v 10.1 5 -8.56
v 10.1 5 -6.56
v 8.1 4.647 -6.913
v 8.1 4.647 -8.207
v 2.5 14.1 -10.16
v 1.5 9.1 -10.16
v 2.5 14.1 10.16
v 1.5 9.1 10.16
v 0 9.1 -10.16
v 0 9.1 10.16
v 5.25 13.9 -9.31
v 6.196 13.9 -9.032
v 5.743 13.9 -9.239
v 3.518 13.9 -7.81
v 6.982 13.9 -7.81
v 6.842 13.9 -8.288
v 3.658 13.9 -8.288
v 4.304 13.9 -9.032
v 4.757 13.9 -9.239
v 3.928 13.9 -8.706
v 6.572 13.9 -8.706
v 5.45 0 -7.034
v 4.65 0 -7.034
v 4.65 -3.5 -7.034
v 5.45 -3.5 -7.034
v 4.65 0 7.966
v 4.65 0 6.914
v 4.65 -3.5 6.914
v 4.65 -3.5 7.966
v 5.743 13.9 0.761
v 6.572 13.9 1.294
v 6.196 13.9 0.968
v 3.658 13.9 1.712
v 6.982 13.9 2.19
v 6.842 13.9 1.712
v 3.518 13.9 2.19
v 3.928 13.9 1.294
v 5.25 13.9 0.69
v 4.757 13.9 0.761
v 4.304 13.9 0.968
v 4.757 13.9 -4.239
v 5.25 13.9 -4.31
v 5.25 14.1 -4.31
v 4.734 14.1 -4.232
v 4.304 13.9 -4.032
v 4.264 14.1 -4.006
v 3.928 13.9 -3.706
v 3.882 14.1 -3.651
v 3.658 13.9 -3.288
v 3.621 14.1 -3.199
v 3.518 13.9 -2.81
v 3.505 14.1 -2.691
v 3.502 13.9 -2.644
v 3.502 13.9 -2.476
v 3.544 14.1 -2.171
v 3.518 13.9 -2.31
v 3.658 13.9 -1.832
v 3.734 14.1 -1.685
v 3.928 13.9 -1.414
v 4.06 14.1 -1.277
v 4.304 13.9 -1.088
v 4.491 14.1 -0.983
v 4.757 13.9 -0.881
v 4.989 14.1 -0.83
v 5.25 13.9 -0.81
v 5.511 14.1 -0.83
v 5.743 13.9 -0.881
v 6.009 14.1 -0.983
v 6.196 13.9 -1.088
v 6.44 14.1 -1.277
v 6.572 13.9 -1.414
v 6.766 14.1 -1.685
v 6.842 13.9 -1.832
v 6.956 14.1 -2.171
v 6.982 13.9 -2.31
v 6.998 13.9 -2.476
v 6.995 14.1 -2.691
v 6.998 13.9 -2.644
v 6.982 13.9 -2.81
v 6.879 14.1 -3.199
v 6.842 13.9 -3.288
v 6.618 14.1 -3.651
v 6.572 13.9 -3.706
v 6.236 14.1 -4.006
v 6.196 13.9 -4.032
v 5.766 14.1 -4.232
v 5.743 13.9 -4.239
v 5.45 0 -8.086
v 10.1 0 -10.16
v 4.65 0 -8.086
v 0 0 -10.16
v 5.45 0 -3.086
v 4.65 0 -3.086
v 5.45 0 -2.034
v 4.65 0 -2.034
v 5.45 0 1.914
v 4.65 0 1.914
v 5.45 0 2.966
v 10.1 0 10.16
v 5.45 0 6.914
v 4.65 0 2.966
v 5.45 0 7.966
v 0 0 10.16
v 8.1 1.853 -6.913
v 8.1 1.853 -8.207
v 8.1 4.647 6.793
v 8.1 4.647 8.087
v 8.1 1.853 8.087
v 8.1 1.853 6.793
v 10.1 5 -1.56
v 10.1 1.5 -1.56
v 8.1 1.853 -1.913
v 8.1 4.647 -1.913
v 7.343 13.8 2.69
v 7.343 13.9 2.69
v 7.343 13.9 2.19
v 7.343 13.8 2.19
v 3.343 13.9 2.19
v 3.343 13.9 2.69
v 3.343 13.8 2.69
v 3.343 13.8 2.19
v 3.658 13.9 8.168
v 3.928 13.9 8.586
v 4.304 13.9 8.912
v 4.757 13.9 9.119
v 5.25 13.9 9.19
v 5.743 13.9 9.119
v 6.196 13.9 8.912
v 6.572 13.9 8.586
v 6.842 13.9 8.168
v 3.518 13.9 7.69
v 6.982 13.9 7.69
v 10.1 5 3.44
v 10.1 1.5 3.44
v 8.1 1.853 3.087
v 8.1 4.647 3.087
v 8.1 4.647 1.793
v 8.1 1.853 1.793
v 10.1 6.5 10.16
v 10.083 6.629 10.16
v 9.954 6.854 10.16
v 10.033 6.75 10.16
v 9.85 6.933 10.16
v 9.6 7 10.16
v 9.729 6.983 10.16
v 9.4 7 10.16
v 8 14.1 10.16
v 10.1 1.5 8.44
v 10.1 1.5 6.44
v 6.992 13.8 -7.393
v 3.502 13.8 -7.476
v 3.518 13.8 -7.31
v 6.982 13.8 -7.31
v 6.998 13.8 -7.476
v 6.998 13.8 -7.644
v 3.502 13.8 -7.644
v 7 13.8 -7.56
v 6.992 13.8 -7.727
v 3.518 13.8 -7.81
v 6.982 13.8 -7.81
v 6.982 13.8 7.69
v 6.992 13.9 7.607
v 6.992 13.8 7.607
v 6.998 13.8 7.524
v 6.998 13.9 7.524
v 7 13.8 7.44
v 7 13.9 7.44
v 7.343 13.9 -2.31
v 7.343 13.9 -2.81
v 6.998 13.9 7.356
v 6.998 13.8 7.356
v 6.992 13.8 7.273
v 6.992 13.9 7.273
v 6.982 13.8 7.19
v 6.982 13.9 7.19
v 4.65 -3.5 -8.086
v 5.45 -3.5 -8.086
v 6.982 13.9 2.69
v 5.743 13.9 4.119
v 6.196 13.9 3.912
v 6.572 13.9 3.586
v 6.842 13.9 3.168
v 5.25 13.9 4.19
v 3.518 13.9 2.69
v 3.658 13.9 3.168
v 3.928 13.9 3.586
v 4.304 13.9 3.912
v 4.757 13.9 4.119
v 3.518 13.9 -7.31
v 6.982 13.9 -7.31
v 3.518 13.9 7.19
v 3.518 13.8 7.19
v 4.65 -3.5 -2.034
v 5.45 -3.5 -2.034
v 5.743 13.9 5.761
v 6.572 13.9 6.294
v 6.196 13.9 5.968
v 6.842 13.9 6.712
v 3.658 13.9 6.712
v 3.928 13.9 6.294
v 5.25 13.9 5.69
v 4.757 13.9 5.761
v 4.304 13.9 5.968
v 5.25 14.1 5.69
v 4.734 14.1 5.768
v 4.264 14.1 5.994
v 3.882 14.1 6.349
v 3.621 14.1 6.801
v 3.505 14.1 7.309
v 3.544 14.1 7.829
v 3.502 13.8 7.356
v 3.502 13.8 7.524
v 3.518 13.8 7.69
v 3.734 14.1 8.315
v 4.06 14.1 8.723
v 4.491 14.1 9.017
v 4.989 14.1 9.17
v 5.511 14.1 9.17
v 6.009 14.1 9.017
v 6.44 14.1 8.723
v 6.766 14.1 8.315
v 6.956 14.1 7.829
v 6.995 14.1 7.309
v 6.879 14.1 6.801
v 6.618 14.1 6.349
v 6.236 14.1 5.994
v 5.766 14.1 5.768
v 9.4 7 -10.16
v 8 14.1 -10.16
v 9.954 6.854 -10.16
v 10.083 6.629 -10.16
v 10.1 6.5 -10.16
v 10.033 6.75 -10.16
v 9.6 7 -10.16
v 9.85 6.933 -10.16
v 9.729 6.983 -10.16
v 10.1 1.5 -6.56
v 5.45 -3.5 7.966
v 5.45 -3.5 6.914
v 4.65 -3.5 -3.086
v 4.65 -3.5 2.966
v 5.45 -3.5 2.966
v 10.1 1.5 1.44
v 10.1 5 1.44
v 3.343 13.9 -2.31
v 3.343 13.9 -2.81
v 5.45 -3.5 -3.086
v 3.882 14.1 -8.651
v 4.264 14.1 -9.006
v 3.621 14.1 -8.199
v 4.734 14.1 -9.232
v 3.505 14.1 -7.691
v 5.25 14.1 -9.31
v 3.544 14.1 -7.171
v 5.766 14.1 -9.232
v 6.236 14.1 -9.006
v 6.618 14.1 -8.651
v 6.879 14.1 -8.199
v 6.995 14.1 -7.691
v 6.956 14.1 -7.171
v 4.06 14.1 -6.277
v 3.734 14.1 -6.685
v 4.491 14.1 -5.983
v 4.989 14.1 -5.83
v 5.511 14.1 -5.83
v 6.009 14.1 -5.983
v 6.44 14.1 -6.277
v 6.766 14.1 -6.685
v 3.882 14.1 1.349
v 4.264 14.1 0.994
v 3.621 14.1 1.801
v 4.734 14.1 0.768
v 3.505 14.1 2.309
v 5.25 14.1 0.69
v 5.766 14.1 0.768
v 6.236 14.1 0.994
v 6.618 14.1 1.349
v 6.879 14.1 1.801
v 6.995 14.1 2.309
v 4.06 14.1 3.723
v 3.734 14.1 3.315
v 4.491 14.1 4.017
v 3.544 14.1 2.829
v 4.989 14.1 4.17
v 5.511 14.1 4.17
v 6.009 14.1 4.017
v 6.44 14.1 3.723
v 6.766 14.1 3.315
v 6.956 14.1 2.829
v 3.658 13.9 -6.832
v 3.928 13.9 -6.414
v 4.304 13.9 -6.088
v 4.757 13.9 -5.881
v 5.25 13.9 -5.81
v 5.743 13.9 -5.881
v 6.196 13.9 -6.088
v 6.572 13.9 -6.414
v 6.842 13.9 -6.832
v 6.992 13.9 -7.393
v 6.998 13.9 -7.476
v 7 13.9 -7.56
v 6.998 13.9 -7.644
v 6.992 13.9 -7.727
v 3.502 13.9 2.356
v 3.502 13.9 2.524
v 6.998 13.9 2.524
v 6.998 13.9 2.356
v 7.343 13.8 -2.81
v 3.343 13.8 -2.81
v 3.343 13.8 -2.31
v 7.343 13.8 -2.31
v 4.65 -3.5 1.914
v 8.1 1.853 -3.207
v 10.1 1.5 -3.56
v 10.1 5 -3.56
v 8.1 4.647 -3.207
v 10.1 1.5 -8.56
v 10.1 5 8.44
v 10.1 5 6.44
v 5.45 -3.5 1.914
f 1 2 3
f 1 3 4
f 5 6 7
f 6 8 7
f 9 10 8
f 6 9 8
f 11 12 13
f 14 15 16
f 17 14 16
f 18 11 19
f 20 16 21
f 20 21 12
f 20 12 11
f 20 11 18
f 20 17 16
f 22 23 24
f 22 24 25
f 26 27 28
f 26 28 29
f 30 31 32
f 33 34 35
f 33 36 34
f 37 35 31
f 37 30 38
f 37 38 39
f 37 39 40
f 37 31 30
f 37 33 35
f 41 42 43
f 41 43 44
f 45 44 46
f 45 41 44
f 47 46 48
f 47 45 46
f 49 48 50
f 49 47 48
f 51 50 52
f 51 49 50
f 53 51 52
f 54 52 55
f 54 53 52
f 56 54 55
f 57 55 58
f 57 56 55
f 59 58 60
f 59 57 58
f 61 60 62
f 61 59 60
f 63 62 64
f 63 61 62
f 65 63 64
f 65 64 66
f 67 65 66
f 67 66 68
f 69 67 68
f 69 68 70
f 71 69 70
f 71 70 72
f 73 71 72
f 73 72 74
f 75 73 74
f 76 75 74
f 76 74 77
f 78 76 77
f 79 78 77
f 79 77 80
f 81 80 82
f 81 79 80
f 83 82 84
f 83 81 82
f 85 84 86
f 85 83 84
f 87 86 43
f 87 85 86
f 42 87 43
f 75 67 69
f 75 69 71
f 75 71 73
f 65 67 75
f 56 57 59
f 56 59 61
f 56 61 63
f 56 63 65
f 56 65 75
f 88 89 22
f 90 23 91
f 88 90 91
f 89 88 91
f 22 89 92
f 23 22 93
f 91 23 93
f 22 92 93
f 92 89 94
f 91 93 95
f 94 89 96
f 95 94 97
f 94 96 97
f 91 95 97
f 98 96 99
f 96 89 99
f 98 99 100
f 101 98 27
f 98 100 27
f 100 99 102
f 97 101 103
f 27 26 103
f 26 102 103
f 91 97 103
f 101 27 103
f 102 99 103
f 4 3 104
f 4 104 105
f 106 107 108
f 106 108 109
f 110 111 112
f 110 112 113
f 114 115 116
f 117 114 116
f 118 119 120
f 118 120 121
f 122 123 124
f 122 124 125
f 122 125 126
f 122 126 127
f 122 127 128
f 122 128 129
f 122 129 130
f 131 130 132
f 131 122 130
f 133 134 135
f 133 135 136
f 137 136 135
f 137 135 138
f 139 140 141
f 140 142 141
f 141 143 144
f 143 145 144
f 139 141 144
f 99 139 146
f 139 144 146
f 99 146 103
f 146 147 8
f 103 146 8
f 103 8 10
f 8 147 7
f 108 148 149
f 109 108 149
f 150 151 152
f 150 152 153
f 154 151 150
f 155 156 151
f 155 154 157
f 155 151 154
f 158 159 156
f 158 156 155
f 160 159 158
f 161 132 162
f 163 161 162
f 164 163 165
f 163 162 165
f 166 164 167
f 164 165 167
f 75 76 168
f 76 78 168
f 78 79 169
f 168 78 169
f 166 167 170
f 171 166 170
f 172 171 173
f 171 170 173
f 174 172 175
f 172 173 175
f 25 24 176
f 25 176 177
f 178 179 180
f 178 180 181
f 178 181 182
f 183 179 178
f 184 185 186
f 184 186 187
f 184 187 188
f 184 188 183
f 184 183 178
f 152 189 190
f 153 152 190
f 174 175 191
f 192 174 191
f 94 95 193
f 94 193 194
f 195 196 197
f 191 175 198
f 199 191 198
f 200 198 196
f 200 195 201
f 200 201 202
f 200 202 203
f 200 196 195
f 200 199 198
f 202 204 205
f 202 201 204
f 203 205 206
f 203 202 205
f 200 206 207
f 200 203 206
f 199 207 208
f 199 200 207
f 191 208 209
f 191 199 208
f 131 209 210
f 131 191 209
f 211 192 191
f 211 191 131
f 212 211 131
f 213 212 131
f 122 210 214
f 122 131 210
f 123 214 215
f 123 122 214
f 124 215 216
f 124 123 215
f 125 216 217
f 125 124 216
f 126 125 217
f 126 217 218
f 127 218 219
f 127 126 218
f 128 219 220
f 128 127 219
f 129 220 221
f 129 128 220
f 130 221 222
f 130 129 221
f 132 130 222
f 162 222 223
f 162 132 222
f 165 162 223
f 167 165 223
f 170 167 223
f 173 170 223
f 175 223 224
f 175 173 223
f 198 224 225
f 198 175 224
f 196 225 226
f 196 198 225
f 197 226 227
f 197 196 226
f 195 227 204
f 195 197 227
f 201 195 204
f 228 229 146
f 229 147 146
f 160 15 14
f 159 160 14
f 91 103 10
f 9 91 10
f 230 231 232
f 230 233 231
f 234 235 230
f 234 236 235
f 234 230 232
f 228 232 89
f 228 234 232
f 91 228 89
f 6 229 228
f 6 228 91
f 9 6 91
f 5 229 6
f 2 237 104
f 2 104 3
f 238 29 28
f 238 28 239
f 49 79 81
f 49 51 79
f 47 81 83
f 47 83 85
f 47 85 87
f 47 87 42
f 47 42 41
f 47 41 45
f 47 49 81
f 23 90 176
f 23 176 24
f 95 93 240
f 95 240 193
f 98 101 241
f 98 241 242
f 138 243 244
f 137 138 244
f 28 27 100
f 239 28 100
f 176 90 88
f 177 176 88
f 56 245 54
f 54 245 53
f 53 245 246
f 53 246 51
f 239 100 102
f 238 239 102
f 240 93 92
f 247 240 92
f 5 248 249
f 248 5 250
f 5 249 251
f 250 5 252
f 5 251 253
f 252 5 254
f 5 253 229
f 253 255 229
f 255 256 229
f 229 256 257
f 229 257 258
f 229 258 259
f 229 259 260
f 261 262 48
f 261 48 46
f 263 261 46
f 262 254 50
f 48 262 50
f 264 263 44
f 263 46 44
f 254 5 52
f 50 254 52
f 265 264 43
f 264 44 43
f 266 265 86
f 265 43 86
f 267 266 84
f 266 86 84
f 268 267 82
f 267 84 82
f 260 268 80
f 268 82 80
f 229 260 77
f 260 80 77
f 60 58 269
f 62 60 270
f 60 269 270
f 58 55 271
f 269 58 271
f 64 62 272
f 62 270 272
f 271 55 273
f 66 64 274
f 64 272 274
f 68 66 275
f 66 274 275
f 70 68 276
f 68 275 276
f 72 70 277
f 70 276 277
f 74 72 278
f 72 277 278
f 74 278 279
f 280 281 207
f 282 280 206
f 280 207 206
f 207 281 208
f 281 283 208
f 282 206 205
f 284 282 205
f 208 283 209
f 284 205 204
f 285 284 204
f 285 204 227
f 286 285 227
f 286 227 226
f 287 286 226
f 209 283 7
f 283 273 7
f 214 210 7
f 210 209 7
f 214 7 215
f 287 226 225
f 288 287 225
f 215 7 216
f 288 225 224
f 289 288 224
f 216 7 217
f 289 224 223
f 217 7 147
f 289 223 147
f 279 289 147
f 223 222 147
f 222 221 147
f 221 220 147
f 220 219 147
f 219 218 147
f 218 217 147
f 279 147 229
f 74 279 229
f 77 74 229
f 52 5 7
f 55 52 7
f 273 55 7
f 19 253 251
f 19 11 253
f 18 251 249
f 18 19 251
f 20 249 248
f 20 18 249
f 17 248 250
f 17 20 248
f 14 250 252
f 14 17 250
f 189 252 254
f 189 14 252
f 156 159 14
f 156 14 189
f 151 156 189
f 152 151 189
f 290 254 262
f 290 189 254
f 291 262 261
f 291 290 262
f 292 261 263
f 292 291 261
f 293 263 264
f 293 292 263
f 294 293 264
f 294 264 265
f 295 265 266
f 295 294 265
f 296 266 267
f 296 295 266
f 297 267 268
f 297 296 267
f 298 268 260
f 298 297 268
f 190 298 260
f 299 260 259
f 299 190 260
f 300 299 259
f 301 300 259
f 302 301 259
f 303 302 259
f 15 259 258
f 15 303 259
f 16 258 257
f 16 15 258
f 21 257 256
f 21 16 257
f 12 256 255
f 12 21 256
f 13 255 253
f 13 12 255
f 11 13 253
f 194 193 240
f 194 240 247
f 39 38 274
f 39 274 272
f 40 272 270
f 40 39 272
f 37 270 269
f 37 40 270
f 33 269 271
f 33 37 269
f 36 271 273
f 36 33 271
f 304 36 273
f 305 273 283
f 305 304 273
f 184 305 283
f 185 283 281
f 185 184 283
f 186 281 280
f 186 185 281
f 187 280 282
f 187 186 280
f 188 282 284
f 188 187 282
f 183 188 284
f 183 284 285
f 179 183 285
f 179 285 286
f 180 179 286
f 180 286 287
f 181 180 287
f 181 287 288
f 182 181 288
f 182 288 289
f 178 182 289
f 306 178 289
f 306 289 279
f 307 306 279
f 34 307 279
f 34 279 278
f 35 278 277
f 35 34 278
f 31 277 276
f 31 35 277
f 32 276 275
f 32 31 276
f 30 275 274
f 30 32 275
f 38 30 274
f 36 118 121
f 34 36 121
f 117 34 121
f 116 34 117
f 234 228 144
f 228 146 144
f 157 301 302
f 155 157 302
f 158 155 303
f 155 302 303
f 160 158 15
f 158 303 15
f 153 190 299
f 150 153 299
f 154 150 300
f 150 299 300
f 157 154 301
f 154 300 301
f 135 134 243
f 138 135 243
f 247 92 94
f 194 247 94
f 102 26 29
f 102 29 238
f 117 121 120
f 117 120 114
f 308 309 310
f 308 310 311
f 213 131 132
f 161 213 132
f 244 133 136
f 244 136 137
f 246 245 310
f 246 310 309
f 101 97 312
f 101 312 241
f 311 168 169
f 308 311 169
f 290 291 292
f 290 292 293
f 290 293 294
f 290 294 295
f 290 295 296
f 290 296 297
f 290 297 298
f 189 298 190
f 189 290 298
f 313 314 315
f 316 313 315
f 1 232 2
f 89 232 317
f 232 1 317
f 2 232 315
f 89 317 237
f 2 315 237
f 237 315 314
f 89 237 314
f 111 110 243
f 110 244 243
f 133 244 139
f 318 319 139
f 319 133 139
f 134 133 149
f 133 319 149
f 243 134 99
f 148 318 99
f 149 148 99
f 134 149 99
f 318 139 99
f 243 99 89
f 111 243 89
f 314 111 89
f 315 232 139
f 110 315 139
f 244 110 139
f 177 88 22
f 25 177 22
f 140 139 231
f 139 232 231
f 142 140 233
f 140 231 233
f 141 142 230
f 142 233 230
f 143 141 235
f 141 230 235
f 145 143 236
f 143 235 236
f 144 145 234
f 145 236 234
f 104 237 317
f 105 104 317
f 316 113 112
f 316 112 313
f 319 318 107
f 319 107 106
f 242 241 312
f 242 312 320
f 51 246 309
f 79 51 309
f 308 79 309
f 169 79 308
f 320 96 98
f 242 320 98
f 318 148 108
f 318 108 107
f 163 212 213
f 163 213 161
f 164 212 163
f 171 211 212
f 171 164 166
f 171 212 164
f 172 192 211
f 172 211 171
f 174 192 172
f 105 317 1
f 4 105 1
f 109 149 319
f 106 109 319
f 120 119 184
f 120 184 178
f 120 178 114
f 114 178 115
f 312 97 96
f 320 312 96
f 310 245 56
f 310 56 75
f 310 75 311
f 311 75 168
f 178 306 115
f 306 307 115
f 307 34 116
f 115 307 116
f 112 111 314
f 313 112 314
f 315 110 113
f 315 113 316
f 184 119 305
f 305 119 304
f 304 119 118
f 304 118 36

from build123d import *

# Parameters (mm, degrees)
BOSS_EXTRUDE1_DEPTH          = 10.16
FILLET1_R                    = 0.5
CUT_EXTRUDE1_DEPTH           = 21.100885553
CUT_EXTRUDE1_DEPTH_BACK      = 0.2
SKETCH2_R                    = 1.75
SKETCH3_W                    = 0.8
SKETCH3_H                    = 1.05200998
BOSS_EXTRUDE2_DEPTH          = 3.5
SKETCH4_W                    = 2
SKETCH4_H                    = 3.5
CUT_EXTRUDE2_DEPTH           = 2
CUT_EXTRUDE2_DRAFT           = -10
CUT_EXTRUDE2_PROFILE_2_DEPTH = 2
CUT_EXTRUDE2_PROFILE_2_DRAFT = -10
CUT_EXTRUDE2_PROFILE_3_DEPTH = 2
CUT_EXTRUDE2_PROFILE_3_DRAFT = -10
CUT_EXTRUDE2_PROFILE_4_DEPTH = 2
CUT_EXTRUDE2_PROFILE_4_DRAFT = -10
SKETCH5_W                    = 4.000724796
SKETCH5_H                    = 0.5
CUT_EXTRUDE3_DEPTH           = 0.1


with BuildPart() as part:
    # Sketch1 → Boss-Extrude1 (new, symmetric)
    with BuildSketch(Plane.XY):
        Polygon((0, 9.1), (1.5, 9.1), (2.5, 14.1), (8, 14.1), (9.4, 7), (10.1, 7), (10.1, 0), (0, 0), align=None)
    extrude(amount=BOSS_EXTRUDE1_DEPTH, both=True)

    # Fillet1
    fillet1_edges = [part.edges().sort_by_distance(p)[0] for p in [
        (10.1, 7, 0),
    ]]
    fillet(fillet1_edges, radius=FILLET1_R)

    # Sketch2 → Cut-Extrude1 (cut, two sides: drawn at the far end of the back side and taken through both)
    with BuildSketch(Plane(origin=(0, 14.1, 0), x_dir=(1, 0, 0), z_dir=(0, 1, 0)).offset(-CUT_EXTRUDE1_DEPTH_BACK)):
        with Locations(Location((5.25, 7.56, 0), (0, 0, 90))):
            Circle(SKETCH2_R)
        with Locations(Location((5.25, 2.56, 0), (0, 0, 90))):
            Circle(SKETCH2_R)
        with Locations(Location((5.25, -2.44, 0), (0, 0, 90))):
            Circle(SKETCH2_R)
        with Locations(Location((5.25, -7.44, 0), (0, 0, 90))):
            Circle(SKETCH2_R)
    extrude(amount=CUT_EXTRUDE1_DEPTH + CUT_EXTRUDE1_DEPTH_BACK, mode=Mode.SUBTRACT)

    # Sketch3 → Boss-Extrude2 (add)
    with BuildSketch(Plane.XZ):
        with Locations((5.05, 7.44)):
            Rectangle(SKETCH3_W, SKETCH3_H)
        with Locations((5.05, 2.44)):
            Rectangle(SKETCH3_W, SKETCH3_H)
        with Locations((5.05, -2.56)):
            Rectangle(SKETCH3_W, SKETCH3_H)
        with Locations((5.05, -7.56)):
            Rectangle(SKETCH3_W, SKETCH3_H)
    extrude(amount=BOSS_EXTRUDE2_DEPTH)


with BuildPart() as cut_extrude2_tool:
    # Sketch4 → Cut-Extrude2 (with draft: the straight prism first)
    with BuildSketch(Plane(origin=(10.1, 0, 0), x_dir=(0, 0, -1), z_dir=(1, 0, 0))):
        with Locations((-2.44, 3.25)):
            Rectangle(SKETCH4_W, SKETCH4_H)
    extrude(amount=-CUT_EXTRUDE2_DEPTH)
    # Cut-Extrude2: the draft: its side faces are tilted about the plane it starts from
    cut_extrude2_sides = [cut_extrude2_tool.faces().sort_by_distance(p)[0] for p in [
        (9.1, 3.25, 3.44),
        (9.1, 1.5, 2.44),
        (9.1, 3.25, 1.44),
        (9.1, 5, 2.44),
    ]]
    draft(cut_extrude2_sides, Plane(origin=(10.1, 0, 0), x_dir=(0, 0, -1), z_dir=(1, 0, 0)), CUT_EXTRUDE2_DRAFT)


with BuildPart() as part_1:
    add(part.part)

    # Cut-Extrude2: cut by cut_extrude2_tool
    add(cut_extrude2_tool.part, mode=Mode.SUBTRACT)


with BuildPart() as cut_extrude2_profile_2_tool:
    # Sketch4 → Cut-Extrude2 profile 2 (with draft: the straight prism first)
    with BuildSketch(Plane(origin=(10.1, 0, 0), x_dir=(0, 0, -1), z_dir=(1, 0, 0))):
        with Locations((-7.44, 3.25)):
            Rectangle(SKETCH4_W, SKETCH4_H)
    extrude(amount=-CUT_EXTRUDE2_PROFILE_2_DEPTH)
    # Cut-Extrude2 profile 2: the draft: its side faces are tilted about the plane it starts from
    cut_extrude2_profile_2_sides = [cut_extrude2_profile_2_tool.faces().sort_by_distance(p)[0] for p in [
        (9.1, 3.25, 8.44),
        (9.1, 1.5, 7.44),
        (9.1, 3.25, 6.44),
        (9.1, 5, 7.44),
    ]]
    draft(cut_extrude2_profile_2_sides, Plane(origin=(10.1, 0, 0), x_dir=(0, 0, -1), z_dir=(1, 0, 0)), CUT_EXTRUDE2_PROFILE_2_DRAFT)


with BuildPart() as part_2:
    add(part_1.part)

    # Cut-Extrude2 profile 2: cut by cut_extrude2_profile_2_tool
    add(cut_extrude2_profile_2_tool.part, mode=Mode.SUBTRACT)


with BuildPart() as cut_extrude2_profile_3_tool:
    # Sketch4 → Cut-Extrude2 profile 3 (with draft: the straight prism first)
    with BuildSketch(Plane(origin=(10.1, 0, 0), x_dir=(0, 0, -1), z_dir=(1, 0, 0))):
        with Locations((2.56, 3.25)):
            Rectangle(SKETCH4_W, SKETCH4_H)
    extrude(amount=-CUT_EXTRUDE2_PROFILE_3_DEPTH)
    # Cut-Extrude2 profile 3: the draft: its side faces are tilted about the plane it starts from
    cut_extrude2_profile_3_sides = [cut_extrude2_profile_3_tool.faces().sort_by_distance(p)[0] for p in [
        (9.1, 3.25, -1.56),
        (9.1, 1.5, -2.56),
        (9.1, 3.25, -3.56),
        (9.1, 5, -2.56),
    ]]
    draft(cut_extrude2_profile_3_sides, Plane(origin=(10.1, 0, 0), x_dir=(0, 0, -1), z_dir=(1, 0, 0)), CUT_EXTRUDE2_PROFILE_3_DRAFT)


with BuildPart() as part_3:
    add(part_2.part)

    # Cut-Extrude2 profile 3: cut by cut_extrude2_profile_3_tool
    add(cut_extrude2_profile_3_tool.part, mode=Mode.SUBTRACT)


with BuildPart() as cut_extrude2_profile_4_tool:
    # Sketch4 → Cut-Extrude2 profile 4 (with draft: the straight prism first)
    with BuildSketch(Plane(origin=(10.1, 0, 0), x_dir=(0, 0, -1), z_dir=(1, 0, 0))):
        with Locations((7.56, 3.25)):
            Rectangle(SKETCH4_W, SKETCH4_H)
    extrude(amount=-CUT_EXTRUDE2_PROFILE_4_DEPTH)
    # Cut-Extrude2 profile 4: the draft: its side faces are tilted about the plane it starts from
    cut_extrude2_profile_4_sides = [cut_extrude2_profile_4_tool.faces().sort_by_distance(p)[0] for p in [
        (9.1, 3.25, -6.56),
        (9.1, 1.5, -7.56),
        (9.1, 3.25, -8.56),
        (9.1, 5, -7.56),
    ]]
    draft(cut_extrude2_profile_4_sides, Plane(origin=(10.1, 0, 0), x_dir=(0, 0, -1), z_dir=(1, 0, 0)), CUT_EXTRUDE2_PROFILE_4_DRAFT)


with BuildPart() as part_4:
    add(part_3.part)

    # Cut-Extrude2 profile 4: cut by cut_extrude2_profile_4_tool
    add(cut_extrude2_profile_4_tool.part, mode=Mode.SUBTRACT)

    # Sketch5 → Cut-Extrude3 (cut)
    with BuildSketch(Plane(origin=(0, 13.9, 0), x_dir=(1, 0, 0), z_dir=(0, 1, 0))):
        with BuildLine():
            Line((6.982050808, 7.81), (3.517949192, 7.81))
            ThreePointArc((3.517949192, 7.81), (3.5, 7.56), (3.517949192, 7.31))
            Line((3.517949192, 7.31), (6.982050808, 7.31))
            ThreePointArc((6.982050808, 7.31), (6.995506934, 7.434678241), (7, 7.56))
            ThreePointArc((7, 7.56), (6.995506934, 7.685321759), (6.982050808, 7.81))
        make_face()
        with BuildLine():
            Line((6.982050808, -7.19), (3.517949192, -7.19))
            ThreePointArc((3.517949192, -7.19), (3.5, -7.44), (3.517949192, -7.69))
            Line((3.517949192, -7.69), (6.982050808, -7.69))
            ThreePointArc((6.982050808, -7.69), (6.995506934, -7.565321759), (7, -7.44))
            ThreePointArc((7, -7.44), (6.995506934, -7.314678241), (6.982050808, -7.19))
        make_face()
        with Locations((5.343098393, 2.56)):
            Rectangle(SKETCH5_W, SKETCH5_H)
        with Locations((5.343098393, -2.44)):
            Rectangle(SKETCH5_W, SKETCH5_H)
    extrude(amount=-CUT_EXTRUDE3_DEPTH, mode=Mode.SUBTRACT)


solid = part_4.part
